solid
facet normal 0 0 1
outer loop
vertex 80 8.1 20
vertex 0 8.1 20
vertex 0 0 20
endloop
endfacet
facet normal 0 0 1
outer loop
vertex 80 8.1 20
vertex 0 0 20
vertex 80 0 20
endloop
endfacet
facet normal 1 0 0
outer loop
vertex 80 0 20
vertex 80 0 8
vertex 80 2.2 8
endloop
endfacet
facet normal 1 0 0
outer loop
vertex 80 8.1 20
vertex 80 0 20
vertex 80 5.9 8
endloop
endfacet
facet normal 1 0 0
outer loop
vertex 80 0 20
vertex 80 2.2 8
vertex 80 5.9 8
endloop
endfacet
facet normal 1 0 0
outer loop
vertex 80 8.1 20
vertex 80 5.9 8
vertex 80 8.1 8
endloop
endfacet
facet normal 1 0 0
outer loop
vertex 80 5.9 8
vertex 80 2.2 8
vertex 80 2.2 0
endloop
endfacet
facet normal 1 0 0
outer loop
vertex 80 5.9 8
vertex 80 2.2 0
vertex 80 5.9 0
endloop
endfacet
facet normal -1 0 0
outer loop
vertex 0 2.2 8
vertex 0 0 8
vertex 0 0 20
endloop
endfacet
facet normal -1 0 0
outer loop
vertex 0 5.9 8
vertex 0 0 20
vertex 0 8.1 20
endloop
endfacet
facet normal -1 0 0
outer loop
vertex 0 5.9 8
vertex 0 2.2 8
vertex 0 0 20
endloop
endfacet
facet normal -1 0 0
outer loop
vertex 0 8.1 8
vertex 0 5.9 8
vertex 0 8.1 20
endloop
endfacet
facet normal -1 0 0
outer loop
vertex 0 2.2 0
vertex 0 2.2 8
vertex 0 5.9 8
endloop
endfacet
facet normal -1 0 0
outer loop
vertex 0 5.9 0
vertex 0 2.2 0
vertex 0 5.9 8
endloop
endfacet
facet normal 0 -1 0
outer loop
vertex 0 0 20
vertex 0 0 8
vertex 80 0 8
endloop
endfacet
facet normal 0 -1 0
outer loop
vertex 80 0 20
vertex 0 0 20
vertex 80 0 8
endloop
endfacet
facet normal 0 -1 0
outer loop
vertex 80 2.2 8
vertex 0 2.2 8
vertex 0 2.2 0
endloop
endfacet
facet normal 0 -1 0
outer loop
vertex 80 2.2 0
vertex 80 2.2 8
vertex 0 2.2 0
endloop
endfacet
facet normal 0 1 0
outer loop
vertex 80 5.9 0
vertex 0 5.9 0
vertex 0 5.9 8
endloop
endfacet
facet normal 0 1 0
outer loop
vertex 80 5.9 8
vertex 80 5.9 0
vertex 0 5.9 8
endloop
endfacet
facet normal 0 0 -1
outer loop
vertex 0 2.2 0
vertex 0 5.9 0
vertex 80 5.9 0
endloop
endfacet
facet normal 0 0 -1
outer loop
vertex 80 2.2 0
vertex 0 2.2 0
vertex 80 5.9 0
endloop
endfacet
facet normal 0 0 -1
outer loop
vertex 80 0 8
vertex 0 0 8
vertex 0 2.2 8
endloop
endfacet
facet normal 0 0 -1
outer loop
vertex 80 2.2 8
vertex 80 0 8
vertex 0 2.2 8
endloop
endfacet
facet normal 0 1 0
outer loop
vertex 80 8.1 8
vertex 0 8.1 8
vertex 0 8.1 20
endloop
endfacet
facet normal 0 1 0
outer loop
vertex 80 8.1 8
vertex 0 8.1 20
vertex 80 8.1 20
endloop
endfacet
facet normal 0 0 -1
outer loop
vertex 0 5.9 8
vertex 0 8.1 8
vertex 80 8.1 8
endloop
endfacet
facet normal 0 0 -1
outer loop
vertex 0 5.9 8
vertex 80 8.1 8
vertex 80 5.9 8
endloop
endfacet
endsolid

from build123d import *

# Parameters (mm, degrees)
SKETCH1_W           = 80
SKETCH1_H           = 8.1
BOSS_EXTRUDE1_DEPTH = 20
CUT_EXTRUDE1_DEPTH  = 85


with BuildPart() as part:
    # Sketch1 → Boss-Extrude1 (new body)
    with BuildSketch(Plane.XY):
        with Locations((40, 4.05)):
            Rectangle(SKETCH1_W, SKETCH1_H)
    extrude(amount=BOSS_EXTRUDE1_DEPTH)

    # Sketch2 → Cut-Extrude1 (cut)
    with BuildSketch(Plane.ZY):
        Polygon((0, 8.1), (8, 8.1), (8, 5.9), (1.006469224, 5.9), (0, 5.9), align=None)
        Polygon((0, 0), (8, 0), (8, 2.2), (1.006469224, 2.2), (0, 2.2), align=None)
    extrude(amount=-CUT_EXTRUDE1_DEPTH, mode=Mode.SUBTRACT)


solid = part.part
